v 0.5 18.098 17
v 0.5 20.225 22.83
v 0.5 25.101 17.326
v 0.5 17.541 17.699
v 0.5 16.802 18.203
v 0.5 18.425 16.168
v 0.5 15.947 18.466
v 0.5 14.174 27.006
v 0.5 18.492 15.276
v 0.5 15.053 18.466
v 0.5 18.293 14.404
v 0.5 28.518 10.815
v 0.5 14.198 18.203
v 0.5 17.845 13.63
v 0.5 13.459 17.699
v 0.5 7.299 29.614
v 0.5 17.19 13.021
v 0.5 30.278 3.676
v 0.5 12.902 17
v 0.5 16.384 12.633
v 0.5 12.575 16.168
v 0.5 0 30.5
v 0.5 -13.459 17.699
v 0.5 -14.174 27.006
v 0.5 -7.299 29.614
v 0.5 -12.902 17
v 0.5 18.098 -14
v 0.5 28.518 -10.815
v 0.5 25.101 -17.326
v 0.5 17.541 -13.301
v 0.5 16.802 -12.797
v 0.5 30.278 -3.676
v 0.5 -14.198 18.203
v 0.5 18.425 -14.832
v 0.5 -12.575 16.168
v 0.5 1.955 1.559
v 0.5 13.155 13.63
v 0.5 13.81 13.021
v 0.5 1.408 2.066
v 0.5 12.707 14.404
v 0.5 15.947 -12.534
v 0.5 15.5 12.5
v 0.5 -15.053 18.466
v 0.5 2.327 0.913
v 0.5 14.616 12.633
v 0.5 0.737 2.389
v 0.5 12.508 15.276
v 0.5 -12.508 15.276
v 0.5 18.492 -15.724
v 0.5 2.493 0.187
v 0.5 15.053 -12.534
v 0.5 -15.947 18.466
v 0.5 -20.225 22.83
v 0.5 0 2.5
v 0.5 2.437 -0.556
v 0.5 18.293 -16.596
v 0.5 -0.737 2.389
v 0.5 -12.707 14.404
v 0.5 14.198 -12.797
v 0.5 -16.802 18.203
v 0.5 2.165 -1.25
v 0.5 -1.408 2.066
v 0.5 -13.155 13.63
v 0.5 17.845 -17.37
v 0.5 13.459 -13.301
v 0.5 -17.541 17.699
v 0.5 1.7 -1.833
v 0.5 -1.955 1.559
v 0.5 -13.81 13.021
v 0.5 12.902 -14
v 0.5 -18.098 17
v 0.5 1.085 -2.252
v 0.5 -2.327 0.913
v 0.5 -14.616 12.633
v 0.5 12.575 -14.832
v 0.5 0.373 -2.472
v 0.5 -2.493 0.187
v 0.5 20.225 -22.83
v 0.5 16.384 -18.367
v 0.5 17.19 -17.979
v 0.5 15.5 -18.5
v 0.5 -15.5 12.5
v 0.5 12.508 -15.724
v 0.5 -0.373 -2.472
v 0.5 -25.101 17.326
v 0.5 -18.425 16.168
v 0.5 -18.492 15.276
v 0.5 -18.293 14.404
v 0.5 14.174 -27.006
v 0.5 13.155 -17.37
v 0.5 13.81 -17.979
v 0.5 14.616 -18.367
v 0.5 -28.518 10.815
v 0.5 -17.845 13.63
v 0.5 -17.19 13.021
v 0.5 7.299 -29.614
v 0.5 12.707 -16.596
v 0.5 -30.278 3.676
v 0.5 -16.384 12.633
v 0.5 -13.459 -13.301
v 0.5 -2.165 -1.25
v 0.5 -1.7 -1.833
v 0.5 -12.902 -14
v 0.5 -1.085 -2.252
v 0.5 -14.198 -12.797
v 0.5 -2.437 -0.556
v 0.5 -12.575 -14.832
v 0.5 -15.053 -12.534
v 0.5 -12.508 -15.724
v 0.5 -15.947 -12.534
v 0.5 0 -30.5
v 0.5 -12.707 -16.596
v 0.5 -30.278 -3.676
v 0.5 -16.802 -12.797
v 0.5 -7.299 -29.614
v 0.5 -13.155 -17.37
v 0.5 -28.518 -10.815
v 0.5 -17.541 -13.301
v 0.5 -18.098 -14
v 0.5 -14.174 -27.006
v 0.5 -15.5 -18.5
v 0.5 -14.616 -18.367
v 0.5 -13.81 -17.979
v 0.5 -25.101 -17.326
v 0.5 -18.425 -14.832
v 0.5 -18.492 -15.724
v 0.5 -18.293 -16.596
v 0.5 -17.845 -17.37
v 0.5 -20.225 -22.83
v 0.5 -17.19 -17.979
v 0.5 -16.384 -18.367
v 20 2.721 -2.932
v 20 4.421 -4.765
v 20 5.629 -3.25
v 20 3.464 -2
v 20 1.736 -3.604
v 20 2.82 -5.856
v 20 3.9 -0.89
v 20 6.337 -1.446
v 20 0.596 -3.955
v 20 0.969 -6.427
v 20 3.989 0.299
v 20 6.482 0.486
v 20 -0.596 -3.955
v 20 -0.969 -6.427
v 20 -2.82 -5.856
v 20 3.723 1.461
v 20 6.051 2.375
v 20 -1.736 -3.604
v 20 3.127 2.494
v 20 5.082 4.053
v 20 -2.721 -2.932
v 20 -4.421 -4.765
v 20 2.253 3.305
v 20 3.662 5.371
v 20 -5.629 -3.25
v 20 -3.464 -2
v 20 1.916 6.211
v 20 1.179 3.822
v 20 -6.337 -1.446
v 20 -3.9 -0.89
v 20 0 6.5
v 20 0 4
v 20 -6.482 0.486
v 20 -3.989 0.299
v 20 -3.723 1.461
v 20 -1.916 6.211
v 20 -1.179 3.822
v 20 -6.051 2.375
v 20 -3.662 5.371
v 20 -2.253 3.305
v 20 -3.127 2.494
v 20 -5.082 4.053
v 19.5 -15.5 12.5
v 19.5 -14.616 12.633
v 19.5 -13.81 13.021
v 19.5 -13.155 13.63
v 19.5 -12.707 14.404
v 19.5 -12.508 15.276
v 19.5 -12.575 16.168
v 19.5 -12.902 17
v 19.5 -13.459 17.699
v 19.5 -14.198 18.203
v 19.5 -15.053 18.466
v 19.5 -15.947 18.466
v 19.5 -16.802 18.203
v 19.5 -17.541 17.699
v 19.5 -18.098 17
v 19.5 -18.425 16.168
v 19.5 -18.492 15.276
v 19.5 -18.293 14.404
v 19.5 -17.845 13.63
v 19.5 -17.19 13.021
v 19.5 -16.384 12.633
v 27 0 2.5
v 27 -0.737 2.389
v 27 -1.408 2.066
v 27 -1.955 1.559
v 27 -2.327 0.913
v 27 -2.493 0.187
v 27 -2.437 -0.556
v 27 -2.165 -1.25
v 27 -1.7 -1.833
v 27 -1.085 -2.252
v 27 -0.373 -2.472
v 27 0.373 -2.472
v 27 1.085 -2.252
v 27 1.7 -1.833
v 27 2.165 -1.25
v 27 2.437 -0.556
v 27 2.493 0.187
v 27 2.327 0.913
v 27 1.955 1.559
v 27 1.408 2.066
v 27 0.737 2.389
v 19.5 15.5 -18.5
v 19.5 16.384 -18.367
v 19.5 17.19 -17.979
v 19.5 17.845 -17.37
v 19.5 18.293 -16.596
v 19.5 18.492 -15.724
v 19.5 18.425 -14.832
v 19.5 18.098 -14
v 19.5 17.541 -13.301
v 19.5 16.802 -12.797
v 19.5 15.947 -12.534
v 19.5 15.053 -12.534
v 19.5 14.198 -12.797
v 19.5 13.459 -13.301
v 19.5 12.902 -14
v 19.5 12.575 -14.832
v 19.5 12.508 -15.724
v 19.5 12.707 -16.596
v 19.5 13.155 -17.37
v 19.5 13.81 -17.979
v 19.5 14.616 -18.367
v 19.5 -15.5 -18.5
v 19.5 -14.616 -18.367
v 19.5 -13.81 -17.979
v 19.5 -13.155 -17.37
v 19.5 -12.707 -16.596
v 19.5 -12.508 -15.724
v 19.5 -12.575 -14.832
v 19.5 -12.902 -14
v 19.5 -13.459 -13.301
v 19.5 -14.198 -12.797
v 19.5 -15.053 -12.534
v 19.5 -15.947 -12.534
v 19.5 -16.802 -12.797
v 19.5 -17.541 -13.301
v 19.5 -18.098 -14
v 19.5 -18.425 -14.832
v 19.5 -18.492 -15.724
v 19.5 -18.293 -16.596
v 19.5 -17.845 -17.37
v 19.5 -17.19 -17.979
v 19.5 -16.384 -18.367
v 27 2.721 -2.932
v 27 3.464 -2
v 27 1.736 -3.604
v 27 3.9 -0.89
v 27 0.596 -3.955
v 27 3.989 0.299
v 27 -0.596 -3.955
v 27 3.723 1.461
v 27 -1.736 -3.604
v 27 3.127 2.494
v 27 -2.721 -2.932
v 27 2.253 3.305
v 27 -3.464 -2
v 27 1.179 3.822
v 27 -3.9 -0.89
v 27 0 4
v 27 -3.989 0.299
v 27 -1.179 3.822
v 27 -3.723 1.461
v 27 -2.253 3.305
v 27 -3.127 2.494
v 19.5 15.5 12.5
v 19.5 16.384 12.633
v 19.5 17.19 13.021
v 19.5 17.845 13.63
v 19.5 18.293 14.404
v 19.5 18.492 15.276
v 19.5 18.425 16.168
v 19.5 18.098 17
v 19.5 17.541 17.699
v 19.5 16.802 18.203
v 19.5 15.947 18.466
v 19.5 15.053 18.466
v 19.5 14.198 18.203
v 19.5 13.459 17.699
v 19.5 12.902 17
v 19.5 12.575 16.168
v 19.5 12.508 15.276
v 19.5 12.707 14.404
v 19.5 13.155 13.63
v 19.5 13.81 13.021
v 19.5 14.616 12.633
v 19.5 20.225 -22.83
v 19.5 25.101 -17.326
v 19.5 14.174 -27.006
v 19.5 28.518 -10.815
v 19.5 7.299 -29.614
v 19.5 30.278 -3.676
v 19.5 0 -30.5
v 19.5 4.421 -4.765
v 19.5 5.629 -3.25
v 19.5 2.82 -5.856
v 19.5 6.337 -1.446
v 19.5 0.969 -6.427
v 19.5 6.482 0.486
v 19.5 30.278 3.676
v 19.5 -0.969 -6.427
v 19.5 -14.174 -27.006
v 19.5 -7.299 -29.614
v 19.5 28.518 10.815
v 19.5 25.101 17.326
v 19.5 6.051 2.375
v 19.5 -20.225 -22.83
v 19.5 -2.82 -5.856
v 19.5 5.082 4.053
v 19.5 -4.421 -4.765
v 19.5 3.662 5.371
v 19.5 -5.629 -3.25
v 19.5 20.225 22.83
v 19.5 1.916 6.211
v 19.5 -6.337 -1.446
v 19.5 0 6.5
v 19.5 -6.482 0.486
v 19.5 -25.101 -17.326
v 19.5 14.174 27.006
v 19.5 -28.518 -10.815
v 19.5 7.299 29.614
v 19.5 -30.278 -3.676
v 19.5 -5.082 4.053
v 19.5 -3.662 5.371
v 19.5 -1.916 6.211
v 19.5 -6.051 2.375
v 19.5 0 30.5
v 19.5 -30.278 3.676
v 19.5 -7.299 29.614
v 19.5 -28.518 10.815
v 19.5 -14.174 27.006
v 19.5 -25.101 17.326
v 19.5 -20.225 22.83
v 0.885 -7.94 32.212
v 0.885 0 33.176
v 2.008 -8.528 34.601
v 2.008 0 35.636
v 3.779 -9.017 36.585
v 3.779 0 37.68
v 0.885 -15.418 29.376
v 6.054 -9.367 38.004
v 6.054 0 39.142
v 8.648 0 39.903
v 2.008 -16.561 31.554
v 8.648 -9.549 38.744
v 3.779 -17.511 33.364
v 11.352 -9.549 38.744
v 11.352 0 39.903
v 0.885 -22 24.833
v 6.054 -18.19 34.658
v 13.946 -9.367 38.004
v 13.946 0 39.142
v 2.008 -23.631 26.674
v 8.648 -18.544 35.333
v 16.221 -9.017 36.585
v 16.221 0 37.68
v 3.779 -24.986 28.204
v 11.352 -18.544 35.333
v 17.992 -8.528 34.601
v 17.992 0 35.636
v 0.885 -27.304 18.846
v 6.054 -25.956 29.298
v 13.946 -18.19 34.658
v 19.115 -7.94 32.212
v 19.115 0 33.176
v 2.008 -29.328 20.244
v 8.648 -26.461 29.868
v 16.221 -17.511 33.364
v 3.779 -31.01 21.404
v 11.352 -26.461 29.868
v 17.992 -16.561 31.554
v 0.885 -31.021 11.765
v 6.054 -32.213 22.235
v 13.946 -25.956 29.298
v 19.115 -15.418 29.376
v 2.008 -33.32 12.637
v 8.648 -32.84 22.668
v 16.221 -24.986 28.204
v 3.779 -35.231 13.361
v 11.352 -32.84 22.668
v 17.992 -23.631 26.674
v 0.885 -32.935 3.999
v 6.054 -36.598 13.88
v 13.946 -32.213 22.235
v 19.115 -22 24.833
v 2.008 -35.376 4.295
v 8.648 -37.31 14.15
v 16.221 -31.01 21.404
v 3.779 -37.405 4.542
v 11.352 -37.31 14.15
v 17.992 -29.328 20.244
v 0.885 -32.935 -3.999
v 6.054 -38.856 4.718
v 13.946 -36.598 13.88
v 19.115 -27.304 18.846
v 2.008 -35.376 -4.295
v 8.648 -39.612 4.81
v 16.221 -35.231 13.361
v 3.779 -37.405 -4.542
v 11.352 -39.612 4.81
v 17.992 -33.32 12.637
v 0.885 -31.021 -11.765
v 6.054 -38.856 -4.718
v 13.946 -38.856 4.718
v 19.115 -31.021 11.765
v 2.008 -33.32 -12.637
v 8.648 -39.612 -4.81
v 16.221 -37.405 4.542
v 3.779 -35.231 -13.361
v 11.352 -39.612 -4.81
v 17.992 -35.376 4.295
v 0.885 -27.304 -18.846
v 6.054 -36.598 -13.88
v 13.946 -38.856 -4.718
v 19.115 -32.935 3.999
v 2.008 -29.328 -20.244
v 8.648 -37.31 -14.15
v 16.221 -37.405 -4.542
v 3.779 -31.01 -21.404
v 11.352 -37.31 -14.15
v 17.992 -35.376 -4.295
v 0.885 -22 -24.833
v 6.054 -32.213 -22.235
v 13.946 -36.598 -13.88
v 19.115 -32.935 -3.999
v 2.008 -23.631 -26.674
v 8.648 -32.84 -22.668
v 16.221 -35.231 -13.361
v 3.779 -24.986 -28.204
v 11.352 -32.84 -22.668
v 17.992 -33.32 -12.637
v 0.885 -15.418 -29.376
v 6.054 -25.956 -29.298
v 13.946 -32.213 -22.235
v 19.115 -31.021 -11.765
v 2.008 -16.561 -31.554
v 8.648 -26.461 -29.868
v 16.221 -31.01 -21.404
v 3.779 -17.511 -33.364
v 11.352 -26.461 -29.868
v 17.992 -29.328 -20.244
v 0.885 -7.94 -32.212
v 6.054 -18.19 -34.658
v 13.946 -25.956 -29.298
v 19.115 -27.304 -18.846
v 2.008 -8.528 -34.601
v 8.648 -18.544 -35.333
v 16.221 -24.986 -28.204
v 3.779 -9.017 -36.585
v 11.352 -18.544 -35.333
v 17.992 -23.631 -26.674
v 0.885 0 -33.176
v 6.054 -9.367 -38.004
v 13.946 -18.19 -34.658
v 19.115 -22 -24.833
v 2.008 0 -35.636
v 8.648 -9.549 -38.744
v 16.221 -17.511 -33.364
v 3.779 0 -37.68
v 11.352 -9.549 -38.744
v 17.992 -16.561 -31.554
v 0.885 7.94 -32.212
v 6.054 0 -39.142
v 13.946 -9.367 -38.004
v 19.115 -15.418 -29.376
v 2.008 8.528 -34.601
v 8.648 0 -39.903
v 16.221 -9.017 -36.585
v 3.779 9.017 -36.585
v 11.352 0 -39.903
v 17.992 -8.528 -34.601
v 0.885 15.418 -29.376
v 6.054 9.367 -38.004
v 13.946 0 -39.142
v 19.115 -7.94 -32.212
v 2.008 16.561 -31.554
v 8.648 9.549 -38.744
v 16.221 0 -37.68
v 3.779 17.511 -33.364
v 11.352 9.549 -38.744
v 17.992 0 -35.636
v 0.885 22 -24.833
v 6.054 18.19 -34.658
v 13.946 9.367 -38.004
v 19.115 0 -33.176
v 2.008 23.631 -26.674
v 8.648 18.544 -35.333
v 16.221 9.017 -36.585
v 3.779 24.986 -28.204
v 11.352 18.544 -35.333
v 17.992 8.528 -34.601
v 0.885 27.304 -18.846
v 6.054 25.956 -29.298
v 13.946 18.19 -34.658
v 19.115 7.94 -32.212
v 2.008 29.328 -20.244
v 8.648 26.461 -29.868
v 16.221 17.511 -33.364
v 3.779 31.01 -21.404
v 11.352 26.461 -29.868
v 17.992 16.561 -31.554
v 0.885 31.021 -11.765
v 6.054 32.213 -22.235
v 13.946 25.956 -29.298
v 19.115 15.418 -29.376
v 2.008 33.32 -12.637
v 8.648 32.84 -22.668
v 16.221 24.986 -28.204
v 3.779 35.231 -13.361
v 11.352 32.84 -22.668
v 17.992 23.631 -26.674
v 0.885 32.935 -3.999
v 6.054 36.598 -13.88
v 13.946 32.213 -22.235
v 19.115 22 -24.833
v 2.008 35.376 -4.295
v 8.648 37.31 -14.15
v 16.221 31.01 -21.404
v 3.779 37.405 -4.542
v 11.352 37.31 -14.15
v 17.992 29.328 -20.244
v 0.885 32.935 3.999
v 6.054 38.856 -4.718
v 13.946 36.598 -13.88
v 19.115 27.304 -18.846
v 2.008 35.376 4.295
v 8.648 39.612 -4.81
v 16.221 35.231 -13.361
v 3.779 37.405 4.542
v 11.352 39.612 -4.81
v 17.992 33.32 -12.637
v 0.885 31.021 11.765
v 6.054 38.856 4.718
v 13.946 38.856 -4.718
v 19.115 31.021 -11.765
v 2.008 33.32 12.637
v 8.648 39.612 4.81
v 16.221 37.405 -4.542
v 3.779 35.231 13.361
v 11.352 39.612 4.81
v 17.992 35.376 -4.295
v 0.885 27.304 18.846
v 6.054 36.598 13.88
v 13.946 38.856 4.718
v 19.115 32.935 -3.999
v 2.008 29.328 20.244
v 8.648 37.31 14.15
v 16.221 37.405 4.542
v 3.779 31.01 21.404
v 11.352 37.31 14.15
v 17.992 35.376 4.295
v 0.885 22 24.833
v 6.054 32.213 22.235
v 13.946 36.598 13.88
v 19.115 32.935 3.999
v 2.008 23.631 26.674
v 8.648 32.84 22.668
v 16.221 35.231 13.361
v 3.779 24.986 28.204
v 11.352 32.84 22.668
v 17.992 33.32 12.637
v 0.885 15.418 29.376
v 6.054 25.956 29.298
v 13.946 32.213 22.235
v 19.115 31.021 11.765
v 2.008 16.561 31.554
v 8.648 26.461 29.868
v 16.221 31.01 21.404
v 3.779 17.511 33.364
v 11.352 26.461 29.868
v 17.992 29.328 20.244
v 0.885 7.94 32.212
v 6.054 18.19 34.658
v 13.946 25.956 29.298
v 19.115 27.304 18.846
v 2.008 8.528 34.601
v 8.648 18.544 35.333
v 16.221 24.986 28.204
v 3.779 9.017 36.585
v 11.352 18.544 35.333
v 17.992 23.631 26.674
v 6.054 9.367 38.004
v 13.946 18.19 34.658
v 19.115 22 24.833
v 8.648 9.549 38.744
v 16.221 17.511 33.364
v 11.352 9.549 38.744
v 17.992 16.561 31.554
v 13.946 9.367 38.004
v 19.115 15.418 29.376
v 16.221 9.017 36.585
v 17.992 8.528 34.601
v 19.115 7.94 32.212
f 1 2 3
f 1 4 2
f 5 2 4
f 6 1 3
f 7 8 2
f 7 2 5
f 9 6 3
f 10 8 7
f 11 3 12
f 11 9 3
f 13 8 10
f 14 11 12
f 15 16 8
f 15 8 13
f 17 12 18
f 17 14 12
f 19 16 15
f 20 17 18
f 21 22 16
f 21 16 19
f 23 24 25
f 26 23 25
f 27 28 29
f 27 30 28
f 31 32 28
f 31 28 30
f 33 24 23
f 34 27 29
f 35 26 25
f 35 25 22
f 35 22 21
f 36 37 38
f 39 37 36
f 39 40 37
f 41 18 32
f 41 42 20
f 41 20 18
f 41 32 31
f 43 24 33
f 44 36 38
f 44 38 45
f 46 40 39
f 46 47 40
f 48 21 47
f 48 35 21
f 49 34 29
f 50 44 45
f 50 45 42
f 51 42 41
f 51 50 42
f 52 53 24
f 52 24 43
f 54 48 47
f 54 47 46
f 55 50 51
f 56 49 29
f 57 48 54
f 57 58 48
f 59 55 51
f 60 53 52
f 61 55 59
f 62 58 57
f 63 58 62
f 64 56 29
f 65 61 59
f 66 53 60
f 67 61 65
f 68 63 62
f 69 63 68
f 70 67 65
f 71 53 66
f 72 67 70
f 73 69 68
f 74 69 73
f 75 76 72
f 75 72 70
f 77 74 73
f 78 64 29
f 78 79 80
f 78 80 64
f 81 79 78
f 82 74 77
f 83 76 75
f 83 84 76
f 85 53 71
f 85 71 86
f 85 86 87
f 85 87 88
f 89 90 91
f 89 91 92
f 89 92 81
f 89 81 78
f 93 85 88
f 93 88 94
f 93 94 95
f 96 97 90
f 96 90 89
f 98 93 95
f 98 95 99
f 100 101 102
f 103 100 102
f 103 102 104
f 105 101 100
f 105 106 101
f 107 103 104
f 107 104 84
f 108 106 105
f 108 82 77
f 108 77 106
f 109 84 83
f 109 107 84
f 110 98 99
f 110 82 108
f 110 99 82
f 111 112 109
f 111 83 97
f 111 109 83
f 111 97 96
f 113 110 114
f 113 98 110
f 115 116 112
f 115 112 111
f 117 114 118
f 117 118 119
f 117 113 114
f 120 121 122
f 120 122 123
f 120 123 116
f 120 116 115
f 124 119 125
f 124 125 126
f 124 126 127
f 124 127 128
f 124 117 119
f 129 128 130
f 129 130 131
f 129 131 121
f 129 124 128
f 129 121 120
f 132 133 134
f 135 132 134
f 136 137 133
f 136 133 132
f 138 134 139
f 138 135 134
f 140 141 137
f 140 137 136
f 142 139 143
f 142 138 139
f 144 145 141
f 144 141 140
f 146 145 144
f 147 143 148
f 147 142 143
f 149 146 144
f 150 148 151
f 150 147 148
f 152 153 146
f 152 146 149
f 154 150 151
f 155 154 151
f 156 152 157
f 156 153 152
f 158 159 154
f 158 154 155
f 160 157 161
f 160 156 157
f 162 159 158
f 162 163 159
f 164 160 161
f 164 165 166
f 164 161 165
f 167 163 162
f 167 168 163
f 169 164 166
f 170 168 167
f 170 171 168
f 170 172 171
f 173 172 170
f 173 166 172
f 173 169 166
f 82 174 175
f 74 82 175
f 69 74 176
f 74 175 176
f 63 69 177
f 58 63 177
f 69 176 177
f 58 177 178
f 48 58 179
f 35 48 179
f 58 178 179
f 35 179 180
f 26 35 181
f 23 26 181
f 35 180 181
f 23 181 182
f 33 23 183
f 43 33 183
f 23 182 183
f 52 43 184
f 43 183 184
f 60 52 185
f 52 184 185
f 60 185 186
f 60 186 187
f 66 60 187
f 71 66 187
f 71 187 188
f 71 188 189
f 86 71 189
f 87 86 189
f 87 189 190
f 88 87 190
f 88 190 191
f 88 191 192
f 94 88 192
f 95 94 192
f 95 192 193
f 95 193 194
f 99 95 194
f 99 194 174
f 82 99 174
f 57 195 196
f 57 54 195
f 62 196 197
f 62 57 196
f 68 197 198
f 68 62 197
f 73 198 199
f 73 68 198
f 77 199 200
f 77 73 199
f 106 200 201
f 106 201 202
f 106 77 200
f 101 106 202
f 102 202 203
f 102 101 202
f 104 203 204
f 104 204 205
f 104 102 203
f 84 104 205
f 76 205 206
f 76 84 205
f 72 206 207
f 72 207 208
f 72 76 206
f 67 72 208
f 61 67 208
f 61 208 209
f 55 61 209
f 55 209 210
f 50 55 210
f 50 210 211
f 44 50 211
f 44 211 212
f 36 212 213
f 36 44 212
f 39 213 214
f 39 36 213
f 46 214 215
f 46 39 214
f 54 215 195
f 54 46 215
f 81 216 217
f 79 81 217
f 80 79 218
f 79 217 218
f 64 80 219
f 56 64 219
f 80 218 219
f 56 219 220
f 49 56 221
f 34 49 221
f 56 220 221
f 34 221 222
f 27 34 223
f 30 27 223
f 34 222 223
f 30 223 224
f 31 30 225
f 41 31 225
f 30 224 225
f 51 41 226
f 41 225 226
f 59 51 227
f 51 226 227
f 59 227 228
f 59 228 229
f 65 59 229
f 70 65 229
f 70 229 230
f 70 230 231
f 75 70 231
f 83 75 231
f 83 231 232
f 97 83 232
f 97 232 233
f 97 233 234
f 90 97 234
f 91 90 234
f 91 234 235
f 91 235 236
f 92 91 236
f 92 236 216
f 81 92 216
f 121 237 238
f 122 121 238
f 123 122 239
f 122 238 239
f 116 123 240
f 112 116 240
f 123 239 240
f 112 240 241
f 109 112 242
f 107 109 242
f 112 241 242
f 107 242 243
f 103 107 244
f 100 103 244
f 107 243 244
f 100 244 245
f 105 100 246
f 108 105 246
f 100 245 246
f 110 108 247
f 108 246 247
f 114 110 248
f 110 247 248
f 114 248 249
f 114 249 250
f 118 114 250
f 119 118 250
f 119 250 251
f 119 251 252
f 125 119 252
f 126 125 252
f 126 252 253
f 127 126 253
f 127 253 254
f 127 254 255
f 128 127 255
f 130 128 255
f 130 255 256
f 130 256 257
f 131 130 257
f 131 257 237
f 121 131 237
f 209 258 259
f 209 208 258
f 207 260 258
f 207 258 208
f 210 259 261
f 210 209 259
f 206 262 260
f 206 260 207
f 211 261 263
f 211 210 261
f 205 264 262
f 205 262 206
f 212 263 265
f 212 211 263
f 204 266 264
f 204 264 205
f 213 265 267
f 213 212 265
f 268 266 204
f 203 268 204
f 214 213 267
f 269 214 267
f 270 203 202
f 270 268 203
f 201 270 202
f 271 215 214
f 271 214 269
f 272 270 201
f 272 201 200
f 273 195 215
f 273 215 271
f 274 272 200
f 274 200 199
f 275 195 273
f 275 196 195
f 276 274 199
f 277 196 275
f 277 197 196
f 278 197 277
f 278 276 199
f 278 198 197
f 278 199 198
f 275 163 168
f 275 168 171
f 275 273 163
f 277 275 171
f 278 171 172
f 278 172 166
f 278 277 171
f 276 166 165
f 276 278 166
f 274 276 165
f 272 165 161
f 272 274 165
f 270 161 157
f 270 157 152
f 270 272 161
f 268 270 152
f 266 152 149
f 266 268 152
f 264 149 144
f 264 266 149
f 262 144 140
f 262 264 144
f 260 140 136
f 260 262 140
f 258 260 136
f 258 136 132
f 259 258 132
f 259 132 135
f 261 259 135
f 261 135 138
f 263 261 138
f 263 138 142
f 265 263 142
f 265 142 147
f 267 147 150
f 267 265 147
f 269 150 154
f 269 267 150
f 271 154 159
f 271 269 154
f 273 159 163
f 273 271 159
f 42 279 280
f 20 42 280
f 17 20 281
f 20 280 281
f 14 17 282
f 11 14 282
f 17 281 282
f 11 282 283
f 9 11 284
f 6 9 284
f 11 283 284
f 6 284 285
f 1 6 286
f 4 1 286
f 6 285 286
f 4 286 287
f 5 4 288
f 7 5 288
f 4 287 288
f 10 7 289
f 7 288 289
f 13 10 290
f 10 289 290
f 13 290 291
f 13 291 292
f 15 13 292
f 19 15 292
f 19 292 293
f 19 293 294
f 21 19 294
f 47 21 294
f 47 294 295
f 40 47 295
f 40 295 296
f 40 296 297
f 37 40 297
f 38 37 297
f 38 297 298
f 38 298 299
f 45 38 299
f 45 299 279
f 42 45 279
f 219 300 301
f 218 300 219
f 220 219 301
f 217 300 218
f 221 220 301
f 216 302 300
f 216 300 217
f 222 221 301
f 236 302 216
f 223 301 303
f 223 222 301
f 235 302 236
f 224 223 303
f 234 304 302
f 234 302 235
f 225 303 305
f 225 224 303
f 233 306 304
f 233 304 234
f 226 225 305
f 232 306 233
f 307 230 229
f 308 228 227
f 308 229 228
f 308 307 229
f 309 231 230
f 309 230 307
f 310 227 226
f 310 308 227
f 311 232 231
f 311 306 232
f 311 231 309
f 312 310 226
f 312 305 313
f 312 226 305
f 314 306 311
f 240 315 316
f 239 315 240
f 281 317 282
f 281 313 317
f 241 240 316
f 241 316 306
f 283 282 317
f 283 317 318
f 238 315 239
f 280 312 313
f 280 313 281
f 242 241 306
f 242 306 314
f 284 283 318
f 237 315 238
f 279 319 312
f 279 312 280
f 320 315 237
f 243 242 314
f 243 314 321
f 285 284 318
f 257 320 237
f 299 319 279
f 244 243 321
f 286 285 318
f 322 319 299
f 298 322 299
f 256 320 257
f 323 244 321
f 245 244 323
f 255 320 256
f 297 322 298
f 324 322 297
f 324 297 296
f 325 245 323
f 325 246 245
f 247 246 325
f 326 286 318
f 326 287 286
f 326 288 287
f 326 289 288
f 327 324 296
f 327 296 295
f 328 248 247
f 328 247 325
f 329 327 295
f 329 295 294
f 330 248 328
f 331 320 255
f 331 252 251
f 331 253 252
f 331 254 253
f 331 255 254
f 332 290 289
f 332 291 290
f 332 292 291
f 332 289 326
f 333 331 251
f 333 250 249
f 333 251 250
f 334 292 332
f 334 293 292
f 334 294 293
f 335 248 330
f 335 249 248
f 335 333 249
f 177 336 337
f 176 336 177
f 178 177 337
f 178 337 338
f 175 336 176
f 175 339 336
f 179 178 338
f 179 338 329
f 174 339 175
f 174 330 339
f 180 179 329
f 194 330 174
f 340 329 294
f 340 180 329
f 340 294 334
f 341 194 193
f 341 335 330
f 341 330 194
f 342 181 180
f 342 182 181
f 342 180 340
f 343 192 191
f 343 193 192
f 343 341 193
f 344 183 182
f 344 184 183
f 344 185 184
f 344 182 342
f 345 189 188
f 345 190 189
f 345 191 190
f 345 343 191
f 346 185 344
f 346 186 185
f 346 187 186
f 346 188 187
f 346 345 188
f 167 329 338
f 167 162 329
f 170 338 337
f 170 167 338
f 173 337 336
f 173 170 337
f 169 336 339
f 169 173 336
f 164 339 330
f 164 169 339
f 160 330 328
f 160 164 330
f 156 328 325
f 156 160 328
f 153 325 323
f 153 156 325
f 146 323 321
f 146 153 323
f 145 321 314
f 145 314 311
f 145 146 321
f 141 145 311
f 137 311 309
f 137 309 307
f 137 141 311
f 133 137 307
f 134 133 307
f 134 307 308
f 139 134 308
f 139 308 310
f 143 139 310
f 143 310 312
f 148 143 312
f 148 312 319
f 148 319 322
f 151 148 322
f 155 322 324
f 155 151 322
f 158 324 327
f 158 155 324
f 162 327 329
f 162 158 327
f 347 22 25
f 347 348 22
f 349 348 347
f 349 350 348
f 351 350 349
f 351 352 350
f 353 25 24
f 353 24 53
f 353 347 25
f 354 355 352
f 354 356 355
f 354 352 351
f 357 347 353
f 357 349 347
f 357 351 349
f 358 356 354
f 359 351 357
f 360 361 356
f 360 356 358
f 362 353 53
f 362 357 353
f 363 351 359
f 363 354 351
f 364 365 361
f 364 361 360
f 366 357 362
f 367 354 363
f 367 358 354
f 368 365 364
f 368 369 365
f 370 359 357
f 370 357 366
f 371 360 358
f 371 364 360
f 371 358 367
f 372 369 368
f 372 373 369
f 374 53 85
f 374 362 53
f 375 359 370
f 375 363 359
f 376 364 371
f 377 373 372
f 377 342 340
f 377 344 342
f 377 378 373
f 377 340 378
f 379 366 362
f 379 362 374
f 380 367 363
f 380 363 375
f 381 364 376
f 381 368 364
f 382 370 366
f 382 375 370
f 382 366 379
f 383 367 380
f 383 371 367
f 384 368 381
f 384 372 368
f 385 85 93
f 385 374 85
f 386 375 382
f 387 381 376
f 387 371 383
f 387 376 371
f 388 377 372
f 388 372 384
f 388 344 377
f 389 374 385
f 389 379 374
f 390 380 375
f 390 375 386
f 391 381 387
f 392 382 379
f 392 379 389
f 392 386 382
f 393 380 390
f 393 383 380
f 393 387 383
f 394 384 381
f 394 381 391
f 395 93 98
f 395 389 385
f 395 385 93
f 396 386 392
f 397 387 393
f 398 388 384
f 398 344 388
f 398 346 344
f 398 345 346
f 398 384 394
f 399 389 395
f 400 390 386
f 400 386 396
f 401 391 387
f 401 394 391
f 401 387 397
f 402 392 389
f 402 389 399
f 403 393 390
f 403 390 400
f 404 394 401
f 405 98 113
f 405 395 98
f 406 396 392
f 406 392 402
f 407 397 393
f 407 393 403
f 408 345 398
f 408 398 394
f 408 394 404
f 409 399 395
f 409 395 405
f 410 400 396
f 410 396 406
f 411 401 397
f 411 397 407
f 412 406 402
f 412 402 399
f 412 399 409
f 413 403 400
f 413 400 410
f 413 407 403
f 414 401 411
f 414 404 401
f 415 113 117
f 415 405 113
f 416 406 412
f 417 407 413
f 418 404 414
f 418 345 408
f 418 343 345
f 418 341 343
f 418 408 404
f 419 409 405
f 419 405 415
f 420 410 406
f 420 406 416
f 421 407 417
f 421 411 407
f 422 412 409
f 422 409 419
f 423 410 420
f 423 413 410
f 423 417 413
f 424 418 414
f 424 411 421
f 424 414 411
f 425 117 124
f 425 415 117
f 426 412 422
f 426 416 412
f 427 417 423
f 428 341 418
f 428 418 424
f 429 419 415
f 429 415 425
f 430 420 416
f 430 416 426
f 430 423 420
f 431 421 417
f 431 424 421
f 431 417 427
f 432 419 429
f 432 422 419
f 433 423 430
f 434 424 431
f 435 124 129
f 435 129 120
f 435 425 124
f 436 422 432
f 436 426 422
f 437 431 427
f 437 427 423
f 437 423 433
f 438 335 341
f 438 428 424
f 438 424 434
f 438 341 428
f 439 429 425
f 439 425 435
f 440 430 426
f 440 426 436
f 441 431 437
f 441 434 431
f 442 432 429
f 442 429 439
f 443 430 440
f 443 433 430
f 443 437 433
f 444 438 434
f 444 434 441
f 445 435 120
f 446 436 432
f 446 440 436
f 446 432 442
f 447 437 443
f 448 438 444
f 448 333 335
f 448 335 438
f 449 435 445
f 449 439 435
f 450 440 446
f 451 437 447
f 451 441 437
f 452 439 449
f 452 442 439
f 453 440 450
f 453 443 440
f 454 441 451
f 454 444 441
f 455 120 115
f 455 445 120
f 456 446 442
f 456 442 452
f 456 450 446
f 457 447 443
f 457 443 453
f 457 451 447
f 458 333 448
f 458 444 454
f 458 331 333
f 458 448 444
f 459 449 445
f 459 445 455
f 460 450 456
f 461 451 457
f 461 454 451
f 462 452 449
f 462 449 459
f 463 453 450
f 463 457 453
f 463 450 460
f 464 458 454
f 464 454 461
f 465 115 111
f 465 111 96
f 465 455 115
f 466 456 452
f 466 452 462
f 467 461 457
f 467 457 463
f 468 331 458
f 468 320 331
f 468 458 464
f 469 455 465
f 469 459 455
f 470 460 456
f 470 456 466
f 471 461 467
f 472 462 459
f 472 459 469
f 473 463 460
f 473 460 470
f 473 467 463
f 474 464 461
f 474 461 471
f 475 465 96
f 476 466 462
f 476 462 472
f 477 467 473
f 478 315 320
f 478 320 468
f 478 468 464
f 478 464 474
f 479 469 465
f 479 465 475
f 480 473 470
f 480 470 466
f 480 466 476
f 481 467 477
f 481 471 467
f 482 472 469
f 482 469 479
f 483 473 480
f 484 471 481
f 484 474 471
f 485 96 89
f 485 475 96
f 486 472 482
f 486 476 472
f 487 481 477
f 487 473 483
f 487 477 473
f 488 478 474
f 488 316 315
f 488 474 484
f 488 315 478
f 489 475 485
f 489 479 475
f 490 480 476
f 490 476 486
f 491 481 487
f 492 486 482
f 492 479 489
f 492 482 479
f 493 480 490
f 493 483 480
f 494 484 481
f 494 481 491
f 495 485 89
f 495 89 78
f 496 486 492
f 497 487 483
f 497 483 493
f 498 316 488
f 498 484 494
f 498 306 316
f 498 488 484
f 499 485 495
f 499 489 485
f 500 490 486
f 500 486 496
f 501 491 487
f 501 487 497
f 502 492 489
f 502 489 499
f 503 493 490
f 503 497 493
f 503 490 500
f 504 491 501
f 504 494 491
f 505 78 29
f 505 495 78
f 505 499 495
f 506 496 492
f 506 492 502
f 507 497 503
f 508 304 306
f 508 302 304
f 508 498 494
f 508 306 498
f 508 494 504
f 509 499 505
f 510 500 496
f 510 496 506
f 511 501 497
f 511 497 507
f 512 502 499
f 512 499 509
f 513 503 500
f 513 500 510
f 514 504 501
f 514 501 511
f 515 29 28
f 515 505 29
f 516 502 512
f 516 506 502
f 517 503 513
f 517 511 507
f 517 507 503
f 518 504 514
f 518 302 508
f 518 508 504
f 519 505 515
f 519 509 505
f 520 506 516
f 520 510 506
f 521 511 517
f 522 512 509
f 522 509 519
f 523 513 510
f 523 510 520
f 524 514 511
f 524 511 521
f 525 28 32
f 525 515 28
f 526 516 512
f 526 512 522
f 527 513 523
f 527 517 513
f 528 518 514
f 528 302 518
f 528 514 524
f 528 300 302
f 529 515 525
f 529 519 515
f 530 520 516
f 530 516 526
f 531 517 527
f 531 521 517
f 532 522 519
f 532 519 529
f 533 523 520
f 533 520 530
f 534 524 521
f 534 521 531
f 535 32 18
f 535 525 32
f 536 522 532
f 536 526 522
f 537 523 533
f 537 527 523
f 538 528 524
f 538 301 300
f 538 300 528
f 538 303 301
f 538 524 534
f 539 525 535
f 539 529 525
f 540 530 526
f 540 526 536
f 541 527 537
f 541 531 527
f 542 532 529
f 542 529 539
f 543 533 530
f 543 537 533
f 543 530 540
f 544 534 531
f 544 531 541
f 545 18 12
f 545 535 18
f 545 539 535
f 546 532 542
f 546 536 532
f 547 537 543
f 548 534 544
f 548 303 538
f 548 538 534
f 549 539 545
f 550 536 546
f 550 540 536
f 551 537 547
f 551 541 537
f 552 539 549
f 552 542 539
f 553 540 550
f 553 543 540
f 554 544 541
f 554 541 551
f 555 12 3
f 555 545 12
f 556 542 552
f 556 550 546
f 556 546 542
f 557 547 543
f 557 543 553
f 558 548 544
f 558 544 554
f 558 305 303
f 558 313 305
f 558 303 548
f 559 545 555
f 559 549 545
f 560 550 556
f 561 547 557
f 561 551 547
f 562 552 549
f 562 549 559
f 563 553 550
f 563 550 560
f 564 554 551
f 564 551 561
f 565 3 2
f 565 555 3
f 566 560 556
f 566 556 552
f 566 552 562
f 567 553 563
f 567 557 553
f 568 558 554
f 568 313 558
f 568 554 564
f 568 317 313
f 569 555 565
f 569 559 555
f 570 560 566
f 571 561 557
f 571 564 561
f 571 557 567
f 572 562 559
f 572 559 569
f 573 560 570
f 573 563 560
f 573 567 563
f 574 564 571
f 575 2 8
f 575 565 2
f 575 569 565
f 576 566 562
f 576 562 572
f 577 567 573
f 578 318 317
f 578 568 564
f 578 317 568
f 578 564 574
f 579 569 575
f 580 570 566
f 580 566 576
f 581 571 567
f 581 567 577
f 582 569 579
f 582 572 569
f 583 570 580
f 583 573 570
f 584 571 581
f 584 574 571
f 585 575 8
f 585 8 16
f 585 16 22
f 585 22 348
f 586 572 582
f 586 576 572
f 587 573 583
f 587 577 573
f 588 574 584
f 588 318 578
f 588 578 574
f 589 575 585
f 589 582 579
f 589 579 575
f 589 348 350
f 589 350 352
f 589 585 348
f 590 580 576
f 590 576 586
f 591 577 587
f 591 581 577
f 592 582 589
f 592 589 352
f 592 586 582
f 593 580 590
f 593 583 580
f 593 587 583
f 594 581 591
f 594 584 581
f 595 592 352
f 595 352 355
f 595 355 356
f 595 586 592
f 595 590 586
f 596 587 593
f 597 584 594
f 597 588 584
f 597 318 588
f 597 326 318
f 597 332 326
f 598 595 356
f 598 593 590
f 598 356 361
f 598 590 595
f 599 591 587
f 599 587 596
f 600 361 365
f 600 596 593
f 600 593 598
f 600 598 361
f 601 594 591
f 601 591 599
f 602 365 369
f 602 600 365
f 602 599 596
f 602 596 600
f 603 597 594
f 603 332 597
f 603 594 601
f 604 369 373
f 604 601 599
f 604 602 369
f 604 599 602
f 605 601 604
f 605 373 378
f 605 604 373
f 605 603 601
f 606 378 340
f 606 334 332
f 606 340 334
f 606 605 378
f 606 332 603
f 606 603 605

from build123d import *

# Parameters (mm, degrees)
SKETCH2_R          = 3
CUT_EXTRUDE1_DEPTH = 60.674115125


with BuildPart() as part:
    # Sketch1 → Revolve1 (revolve)
    with BuildSketch(Plane.XY, mode=Mode.PRIVATE) as revolve1_sk:
        with BuildLine():
            Line((27, 4), (27, 2.5))
            Line((27, 2.5), (20, 2.5))
            Line((20, 2.5), (0.5, 2.5))
            Line((0.5, 2.5), (0.5, 30.5))
            ThreePointArc((0.5, 30.5), (10, 40), (19.5, 30.5))
            Line((19.5, 30.5), (19.5, 6.5))
            Line((19.5, 6.5), (20, 6.5))
            Line((20, 6.5), (20, 4))
            Line((20, 4), (27, 4))
        make_face()
    revolve(revolve1_sk.sketch.rotate(Axis((0, 0, 0), (1, 0, 0)), 90), axis=Axis((0, 0, 0), (1, 0, 0)))

    # Sketch2 → Cut-Extrude1 (cut, through all)
    with BuildSketch(Plane(origin=(19.5, 0, 0), x_dir=(0, 0, -1), z_dir=(1, 0, 0))):
        with Locations((-15.5, 15.5)):
            Circle(SKETCH2_R)
        with Locations((15.5, 15.5)):
            Circle(SKETCH2_R)
        with Locations((15.5, -15.5)):
            Circle(SKETCH2_R)
        with Locations((-15.5, -15.5)):
            Circle(SKETCH2_R)
    extrude(amount=-CUT_EXTRUDE1_DEPTH, mode=Mode.SUBTRACT)


solid = part.part
